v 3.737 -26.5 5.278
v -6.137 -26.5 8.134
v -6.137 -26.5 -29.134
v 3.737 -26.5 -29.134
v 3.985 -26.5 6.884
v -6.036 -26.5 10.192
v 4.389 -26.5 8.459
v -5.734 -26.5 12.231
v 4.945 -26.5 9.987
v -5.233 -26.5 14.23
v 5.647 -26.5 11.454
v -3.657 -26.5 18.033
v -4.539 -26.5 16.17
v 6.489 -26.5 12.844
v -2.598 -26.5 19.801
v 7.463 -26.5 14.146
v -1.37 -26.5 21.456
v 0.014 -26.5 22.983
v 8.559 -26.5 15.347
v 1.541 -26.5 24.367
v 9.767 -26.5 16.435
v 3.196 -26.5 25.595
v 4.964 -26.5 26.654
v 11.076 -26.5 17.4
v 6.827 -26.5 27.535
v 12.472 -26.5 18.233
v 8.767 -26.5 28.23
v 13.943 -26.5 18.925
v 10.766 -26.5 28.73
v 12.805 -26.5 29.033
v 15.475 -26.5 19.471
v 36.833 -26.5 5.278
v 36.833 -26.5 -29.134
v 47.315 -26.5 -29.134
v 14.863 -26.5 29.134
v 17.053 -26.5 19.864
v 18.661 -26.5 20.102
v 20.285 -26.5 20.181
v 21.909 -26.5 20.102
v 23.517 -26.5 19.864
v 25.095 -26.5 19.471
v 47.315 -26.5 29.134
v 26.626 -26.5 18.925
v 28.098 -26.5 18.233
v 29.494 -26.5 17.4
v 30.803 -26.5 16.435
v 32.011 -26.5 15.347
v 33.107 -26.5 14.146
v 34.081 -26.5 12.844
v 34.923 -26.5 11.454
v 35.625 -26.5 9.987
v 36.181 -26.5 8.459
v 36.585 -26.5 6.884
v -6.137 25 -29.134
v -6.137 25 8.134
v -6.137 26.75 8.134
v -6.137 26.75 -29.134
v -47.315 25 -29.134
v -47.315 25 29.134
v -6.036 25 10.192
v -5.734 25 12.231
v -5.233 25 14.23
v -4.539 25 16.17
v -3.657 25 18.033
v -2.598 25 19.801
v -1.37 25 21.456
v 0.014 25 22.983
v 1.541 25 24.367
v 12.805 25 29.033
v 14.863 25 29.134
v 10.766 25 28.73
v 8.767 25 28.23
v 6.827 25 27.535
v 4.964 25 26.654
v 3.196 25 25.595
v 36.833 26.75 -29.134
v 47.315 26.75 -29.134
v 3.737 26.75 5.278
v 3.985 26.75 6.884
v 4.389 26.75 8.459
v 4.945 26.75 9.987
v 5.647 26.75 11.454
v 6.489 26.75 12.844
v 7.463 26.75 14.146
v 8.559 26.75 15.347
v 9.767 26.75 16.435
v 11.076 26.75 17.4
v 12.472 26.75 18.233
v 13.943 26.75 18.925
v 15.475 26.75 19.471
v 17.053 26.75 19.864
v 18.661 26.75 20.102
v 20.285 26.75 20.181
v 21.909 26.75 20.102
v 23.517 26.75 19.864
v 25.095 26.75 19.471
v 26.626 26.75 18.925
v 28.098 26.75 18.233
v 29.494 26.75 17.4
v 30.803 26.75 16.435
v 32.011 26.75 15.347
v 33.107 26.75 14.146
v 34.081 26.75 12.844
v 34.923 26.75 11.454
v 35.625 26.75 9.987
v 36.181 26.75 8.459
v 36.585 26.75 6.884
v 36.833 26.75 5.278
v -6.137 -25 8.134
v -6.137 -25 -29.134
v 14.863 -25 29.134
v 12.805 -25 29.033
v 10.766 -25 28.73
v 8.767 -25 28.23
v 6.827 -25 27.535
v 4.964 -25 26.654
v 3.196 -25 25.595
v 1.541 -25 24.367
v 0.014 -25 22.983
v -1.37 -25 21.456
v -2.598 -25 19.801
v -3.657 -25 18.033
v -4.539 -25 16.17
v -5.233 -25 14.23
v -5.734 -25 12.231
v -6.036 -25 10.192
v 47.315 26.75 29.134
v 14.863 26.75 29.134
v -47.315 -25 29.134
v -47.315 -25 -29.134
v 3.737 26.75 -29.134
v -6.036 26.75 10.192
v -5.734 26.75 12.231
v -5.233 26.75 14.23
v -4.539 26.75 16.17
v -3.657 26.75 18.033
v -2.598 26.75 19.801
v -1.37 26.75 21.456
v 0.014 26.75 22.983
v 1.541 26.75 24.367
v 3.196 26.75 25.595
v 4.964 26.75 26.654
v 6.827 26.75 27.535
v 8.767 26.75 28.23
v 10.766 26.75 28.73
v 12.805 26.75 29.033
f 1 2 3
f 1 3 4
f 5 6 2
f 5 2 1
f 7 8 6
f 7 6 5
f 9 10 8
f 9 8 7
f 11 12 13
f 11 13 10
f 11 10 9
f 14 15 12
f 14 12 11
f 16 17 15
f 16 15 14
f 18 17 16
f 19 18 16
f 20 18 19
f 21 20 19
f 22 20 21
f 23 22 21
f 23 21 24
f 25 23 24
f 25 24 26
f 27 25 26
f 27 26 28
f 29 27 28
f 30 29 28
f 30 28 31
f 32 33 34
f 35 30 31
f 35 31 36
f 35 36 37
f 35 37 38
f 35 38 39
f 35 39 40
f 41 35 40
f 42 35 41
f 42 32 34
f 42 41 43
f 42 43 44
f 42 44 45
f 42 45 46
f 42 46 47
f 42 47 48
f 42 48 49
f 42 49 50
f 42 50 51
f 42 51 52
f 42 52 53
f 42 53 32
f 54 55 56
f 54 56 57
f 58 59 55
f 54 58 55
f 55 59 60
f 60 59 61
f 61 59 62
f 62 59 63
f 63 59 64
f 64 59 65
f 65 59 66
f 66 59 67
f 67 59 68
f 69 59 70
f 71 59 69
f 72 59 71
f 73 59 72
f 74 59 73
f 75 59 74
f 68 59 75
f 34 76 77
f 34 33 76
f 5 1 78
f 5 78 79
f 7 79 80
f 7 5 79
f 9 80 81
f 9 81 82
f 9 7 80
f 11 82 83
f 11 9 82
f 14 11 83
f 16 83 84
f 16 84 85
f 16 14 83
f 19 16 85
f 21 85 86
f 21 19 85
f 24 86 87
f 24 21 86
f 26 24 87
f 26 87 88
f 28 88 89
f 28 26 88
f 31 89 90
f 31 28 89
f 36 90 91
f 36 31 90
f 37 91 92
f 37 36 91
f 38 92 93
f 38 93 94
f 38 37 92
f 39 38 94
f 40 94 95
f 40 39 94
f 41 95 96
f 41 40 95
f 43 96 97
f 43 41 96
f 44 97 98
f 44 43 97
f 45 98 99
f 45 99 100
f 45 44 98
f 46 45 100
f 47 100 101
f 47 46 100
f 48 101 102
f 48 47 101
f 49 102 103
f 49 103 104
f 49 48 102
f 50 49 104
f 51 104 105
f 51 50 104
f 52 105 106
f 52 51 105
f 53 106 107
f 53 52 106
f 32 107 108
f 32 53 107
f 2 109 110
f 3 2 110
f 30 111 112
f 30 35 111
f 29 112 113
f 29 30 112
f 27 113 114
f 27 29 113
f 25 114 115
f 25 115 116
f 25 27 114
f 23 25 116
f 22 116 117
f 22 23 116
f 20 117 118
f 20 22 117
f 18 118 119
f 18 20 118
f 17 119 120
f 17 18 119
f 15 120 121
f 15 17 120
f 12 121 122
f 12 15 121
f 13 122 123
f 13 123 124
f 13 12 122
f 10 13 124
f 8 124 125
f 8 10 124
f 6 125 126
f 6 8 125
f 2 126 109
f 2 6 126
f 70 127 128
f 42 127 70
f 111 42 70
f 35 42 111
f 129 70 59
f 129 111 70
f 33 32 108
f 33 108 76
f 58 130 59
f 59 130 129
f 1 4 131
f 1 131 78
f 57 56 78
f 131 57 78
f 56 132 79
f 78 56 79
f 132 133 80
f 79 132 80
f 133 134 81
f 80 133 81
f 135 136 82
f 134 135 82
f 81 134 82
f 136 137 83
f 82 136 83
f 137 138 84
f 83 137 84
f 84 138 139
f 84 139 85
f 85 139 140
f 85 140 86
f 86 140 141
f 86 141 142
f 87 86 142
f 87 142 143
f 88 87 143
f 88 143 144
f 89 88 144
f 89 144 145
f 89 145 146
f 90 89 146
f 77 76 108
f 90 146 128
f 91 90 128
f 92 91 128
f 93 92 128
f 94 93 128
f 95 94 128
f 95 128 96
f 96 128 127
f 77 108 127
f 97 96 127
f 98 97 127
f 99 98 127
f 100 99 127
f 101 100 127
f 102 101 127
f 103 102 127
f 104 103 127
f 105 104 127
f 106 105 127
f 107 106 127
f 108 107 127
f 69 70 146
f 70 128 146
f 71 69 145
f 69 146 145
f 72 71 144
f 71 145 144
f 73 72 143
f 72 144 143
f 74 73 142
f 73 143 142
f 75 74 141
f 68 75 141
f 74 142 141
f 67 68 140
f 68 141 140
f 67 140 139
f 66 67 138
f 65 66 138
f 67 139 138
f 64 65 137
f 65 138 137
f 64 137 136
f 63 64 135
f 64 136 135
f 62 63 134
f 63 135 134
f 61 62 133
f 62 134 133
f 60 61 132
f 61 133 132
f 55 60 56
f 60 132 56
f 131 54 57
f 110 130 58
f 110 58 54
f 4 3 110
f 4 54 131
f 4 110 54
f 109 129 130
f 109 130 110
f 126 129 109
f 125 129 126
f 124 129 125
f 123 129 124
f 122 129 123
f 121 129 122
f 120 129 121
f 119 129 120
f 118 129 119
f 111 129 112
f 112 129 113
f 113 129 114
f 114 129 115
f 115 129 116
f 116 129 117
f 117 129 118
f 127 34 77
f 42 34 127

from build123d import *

# Parameters (mm, degrees)
F0_W          = 41.1777616951
F0_H          = 58.2677274942
F1_DEPTH      = 25
F1_DEPTH_BACK = 25
F2_DEPTH      = 26.5
F2_DEPTH_BACK = 26.75
F3_R          = 21
F4_R          = 21


with BuildPart() as f1:
    # F0 (on Front) → F1 (new body, two sides)
    with BuildSketch(Plane.XZ) as f1_sk:
        with Locations((-26.726005576, 0)):
            Rectangle(F0_W, F0_H)
    extrude(amount=F1_DEPTH)
    extrude(f1_sk.sketch, amount=-F1_DEPTH_BACK)

    # F0 (on Front) → F2 (join, two sides)
    with BuildSketch(Plane.XZ) as f2_sk:
        with BuildLine():
            Line((47.3148864236, 29.1338637471), (-6.1371247284, 29.1338637471))
            Line((-6.1371247284, 29.1338637471), (-6.1371247284, -29.1338637471))
            Line((-6.1371247284, -29.1338637471), (3.736696206, -29.1338637471))
            Line((3.736696206, -29.1338637471), (3.736696206, 5.2775406944))
            ThreePointArc((3.736696206, 5.2775406944), (20.2848818153, 20.1810889299), (36.8330674246, 5.2775406944))
            Line((36.8330674246, 5.2775406944), (36.8330674246, -29.1338637471))
            Line((36.8330674246, -29.1338637471), (47.3148864236, -29.1338637471))
            Line((47.3148864236, -29.1338637471), (47.3148864236, 29.1338637471))
        make_face()
    extrude(amount=F2_DEPTH)
    extrude(f2_sk.sketch, amount=-F2_DEPTH_BACK)

    # F3
    f3_edges = [f1.edges().sort_by_distance(p)[0] for p in [
        (-6.137125, -25.75, 29.133864),
    ]]
    fillet(f3_edges, radius=F3_R)

    # F4
    f4_edges = [f1.edges().sort_by_distance(p)[0] for p in [
        (-6.137125, 25.875, 29.133864),
    ]]
    fillet(f4_edges, radius=F4_R)


solid = f1.part
